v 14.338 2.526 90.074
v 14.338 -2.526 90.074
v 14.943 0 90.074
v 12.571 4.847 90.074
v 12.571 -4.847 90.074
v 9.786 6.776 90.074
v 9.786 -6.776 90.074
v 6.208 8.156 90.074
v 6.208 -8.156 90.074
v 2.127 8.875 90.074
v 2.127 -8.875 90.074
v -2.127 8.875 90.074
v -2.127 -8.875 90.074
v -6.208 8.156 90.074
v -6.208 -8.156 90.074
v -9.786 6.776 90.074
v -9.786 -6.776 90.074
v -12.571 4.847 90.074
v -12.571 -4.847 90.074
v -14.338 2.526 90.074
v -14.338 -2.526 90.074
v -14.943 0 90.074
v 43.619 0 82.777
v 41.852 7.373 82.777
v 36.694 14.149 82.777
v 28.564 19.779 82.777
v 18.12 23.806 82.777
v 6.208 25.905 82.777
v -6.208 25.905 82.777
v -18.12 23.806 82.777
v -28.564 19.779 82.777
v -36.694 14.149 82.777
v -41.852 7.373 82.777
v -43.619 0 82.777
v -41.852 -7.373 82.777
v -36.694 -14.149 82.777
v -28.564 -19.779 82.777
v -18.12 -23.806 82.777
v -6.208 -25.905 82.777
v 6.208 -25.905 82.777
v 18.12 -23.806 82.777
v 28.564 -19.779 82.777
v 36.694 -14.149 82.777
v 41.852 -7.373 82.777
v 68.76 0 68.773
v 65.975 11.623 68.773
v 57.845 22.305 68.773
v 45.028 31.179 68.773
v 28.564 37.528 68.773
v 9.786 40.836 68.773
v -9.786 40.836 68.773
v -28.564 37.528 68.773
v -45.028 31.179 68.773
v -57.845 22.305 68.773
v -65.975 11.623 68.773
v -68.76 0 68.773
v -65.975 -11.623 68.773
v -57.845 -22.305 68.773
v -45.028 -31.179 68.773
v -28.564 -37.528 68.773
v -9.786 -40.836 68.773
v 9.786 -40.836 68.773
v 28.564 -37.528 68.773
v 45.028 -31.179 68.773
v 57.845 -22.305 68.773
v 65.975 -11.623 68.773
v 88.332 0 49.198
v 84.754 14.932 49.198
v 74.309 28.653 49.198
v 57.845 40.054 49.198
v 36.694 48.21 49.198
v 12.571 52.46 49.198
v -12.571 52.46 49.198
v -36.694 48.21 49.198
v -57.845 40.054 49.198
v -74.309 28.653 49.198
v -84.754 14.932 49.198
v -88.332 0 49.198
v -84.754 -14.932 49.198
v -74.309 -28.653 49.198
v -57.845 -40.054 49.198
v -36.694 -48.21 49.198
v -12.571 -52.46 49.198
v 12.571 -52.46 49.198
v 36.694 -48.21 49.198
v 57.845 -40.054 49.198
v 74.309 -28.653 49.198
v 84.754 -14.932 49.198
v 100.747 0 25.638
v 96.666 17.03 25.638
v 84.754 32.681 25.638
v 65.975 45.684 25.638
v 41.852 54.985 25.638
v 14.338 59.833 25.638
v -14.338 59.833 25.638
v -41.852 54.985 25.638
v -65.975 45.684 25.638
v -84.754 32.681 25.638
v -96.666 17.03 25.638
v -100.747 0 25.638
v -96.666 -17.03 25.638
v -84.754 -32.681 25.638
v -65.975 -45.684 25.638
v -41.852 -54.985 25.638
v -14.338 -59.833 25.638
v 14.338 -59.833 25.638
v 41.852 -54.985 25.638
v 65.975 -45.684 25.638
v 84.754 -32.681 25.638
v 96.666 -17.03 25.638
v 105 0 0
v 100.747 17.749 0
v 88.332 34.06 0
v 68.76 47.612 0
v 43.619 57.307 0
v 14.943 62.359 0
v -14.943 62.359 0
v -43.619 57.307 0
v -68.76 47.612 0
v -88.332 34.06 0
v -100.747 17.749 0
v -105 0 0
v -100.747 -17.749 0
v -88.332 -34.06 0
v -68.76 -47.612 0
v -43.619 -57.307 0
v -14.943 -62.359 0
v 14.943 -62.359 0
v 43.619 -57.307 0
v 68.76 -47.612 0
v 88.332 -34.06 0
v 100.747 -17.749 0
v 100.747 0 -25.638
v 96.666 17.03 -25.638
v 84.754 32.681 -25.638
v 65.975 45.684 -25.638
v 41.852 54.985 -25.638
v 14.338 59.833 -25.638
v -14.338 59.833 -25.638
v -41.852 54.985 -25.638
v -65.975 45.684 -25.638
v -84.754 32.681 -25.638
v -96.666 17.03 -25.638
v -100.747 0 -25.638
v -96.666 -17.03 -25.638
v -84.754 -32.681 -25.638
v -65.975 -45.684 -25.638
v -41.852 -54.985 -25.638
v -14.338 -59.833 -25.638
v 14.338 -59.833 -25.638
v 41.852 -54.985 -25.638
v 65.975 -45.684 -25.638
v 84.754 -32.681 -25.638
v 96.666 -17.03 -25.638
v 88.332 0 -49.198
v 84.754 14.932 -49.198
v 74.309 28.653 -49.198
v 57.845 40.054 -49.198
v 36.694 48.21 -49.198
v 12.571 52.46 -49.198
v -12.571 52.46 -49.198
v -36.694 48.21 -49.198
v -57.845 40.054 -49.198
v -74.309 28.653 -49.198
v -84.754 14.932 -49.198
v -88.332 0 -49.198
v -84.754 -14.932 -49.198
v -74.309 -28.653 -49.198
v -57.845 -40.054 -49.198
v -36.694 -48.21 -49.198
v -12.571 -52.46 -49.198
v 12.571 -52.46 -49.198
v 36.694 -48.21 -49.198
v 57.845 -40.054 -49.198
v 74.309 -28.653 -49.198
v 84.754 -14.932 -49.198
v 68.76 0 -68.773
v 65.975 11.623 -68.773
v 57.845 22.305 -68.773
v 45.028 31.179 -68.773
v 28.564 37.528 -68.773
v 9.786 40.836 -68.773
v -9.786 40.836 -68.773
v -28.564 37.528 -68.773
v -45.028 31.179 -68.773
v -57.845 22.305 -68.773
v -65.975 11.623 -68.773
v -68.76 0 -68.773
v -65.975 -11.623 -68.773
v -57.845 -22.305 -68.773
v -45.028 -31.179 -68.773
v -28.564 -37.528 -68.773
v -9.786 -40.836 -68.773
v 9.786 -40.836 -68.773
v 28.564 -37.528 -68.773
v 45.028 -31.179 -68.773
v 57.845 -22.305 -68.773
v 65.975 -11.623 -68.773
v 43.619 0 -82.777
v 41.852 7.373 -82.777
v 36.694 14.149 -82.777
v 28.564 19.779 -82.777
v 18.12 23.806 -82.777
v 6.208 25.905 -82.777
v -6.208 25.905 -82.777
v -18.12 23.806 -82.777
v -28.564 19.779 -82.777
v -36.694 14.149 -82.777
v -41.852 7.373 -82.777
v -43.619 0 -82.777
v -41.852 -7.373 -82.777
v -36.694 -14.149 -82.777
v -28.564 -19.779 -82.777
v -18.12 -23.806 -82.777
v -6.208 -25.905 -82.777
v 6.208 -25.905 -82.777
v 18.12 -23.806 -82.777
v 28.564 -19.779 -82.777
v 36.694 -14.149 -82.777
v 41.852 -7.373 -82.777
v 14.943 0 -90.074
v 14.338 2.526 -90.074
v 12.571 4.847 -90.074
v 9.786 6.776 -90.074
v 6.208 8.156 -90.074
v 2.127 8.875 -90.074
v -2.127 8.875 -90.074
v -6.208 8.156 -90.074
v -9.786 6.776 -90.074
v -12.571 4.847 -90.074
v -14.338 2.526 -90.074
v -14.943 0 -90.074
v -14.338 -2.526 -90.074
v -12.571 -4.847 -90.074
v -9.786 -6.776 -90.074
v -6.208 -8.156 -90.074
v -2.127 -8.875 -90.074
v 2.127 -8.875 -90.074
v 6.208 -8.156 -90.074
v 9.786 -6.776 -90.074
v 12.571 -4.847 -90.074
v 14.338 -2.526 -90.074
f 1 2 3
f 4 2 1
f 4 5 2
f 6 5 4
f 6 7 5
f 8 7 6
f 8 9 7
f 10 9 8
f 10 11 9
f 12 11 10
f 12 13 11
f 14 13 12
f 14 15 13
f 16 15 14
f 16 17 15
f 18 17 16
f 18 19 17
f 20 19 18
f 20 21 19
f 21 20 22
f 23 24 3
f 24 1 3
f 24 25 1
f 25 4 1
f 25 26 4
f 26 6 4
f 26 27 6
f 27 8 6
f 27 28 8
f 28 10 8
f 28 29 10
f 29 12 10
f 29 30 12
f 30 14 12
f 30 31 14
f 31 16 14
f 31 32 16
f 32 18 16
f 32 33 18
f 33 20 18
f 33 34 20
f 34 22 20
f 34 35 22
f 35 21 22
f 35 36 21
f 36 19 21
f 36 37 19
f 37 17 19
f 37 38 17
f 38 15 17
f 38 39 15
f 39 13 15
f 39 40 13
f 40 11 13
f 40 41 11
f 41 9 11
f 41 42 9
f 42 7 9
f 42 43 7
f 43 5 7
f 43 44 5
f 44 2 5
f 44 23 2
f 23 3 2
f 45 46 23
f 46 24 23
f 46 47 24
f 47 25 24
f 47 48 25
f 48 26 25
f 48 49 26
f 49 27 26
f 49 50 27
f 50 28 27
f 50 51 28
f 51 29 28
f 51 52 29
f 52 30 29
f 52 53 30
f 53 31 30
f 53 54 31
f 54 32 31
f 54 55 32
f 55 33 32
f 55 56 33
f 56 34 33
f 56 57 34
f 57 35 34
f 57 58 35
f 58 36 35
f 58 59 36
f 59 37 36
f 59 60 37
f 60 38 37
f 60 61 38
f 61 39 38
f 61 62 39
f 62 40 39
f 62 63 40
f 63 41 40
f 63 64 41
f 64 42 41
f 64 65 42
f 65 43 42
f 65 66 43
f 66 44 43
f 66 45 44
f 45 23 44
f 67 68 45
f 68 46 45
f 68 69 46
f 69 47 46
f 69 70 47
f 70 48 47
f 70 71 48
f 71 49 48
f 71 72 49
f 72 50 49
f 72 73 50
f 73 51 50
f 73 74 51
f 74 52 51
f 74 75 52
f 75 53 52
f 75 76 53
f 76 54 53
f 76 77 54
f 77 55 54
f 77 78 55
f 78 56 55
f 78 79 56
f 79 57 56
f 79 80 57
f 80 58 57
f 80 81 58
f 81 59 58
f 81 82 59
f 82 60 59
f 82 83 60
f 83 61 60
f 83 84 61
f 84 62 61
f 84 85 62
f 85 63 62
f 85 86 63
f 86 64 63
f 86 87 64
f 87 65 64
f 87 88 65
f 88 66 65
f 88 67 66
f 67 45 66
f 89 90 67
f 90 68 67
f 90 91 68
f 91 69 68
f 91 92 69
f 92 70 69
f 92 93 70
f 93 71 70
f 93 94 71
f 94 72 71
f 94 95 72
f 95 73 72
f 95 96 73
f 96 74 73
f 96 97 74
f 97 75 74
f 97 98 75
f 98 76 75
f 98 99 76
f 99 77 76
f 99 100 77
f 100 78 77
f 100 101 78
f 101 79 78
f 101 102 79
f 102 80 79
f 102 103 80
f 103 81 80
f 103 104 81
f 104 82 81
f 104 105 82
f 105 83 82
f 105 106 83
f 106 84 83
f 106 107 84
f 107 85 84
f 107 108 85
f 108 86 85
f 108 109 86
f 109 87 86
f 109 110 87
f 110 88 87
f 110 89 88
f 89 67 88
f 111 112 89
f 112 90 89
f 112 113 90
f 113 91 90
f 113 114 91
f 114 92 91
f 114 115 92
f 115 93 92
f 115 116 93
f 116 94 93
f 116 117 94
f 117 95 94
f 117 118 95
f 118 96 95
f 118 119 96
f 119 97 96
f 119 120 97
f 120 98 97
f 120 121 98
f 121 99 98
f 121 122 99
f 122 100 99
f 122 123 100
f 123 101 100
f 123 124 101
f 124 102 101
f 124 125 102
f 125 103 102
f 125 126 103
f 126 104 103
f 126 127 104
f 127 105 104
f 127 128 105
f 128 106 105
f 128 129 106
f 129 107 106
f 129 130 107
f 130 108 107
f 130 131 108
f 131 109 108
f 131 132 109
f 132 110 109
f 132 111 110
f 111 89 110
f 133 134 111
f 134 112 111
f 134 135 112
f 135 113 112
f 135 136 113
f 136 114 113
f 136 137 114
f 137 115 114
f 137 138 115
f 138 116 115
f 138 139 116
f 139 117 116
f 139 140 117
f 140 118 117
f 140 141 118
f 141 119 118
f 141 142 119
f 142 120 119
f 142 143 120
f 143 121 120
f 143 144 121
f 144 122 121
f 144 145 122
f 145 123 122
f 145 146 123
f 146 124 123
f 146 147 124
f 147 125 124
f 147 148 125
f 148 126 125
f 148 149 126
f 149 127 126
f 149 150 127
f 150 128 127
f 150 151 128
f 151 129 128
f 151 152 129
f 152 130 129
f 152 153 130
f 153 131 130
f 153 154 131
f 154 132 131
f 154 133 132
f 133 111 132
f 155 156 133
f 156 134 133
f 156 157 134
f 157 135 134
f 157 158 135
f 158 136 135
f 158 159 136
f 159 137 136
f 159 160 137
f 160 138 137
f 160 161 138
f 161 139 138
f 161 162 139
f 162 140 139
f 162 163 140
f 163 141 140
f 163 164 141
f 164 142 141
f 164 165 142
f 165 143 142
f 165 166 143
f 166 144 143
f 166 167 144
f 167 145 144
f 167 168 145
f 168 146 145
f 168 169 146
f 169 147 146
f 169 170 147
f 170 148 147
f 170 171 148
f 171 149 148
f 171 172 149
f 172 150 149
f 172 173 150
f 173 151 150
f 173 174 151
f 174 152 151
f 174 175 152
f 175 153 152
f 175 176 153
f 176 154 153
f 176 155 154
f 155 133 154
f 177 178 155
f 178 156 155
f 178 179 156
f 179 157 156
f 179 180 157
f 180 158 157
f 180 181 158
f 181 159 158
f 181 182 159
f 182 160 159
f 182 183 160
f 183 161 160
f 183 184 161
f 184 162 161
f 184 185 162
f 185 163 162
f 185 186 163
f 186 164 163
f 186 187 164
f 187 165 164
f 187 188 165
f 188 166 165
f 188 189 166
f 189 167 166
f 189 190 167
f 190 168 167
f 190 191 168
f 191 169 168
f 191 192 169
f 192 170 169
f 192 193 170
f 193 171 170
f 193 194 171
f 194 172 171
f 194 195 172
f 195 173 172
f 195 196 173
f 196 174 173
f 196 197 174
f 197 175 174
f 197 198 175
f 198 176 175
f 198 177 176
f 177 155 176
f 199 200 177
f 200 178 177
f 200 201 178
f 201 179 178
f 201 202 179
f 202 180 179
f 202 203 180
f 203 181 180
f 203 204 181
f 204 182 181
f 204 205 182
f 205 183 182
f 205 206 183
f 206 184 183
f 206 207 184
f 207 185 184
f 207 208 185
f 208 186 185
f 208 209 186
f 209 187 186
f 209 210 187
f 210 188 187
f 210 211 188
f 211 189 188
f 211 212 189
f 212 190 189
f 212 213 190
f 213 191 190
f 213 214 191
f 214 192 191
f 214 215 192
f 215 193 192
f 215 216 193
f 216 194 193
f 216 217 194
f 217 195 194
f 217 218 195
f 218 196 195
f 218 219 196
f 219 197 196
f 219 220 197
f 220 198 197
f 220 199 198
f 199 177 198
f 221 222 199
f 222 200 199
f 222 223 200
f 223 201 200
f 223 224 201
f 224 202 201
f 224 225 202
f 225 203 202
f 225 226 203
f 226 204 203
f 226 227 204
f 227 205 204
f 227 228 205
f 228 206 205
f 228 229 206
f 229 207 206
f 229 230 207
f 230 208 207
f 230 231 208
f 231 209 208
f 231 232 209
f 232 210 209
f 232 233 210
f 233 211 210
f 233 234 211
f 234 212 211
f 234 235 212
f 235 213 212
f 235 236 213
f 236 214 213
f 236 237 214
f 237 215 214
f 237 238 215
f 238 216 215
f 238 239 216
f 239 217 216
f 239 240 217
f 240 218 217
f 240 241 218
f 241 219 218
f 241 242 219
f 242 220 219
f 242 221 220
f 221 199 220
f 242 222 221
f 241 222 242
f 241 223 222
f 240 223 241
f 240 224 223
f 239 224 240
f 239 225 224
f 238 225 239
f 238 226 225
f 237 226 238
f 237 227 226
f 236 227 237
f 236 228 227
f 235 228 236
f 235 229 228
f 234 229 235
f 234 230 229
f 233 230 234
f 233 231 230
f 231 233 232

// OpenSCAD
// Generated by SolidPython 1.0.1 on 2020-07-29 00:46:52


scale(v = [15, 9, 13]) {
	sphere(r = 7);
}
/***********************************************
*********      SolidPython code:      **********
************************************************
 
# import packages: SolidPython
from solid import *
from solid.utils import *
from itertools import chain, combinations, permutations


class Resize:

    def __init__(self, scad_file):
        self.scad_file = scad_file
        #self.scad_file = import_scad(scad_file)
        # cone/cylinder param:
        self.r1 = 0
        self.r2 = 0
        self.h = 0
        # rectangular prism param:
        self.w = 0
        self.l = 0
        # ellipse param:
        self.r = 0

    # import OpenScad code (file name corresponds to shape)


    # classify shape + parameters
    def assign(self, param1, param2, param3):
        if self.scad_file == 'cone.scad':
            self.r1 = param1
            self.r2 = param2
            self.h = param3
        elif self.scad_file == 'cylinder.scad':
            self.r1 = param1
            self.r2 = param2
            self.h = param3
        elif self.scad_file == 'rectangularPrism.scad':
            self.h = param1
            self.l = param2
            self.w = param3
        else:
            self.r = param1
            self.h = param2

    # resize parameters
    def iterate(self):
        x = range(3, 20, 2)
        i = 1
        if self.scad_file == 'cone.scad':
            tempList = list(permutations(x, 2))
            for temp in tempList:
                param1 = temp[0]
                param2 = temp[1]
                filepath = 'produced_scad_files/' + 'cone' + str(param1) + '_' + str(param2) + '_' + '.scad'
                scad_render_to_file(cylinder(h=param1, r1=param2, r2=0), filepath)

        elif self.scad_file == 'cylinder.scad':
            tempList = list(permutations(x, 3))
            for temp in tempList:
                param1 = temp[0]
                param2 = temp[1]
                filepath = 'produced_scad_files/' + 'cylinder' + str(param1) + '_' + str(param2) + '_' + '.scad'
                scad_render_to_file(cylinder(h=param1, r1=param2, r2=param2), filepath)

        elif self.scad_file == 'rectangularPrism.scad':
            tempList = list(permutations(x, 3))
            for temp in tempList:
                param1 = temp[0]
                param2 = temp[1]
                param3 = temp[2]
                filepath = 'produced_scad_files/' + 'rectangularPrism' + str(param1) + '_' + str(param2) + '_' + str(
                    param3) + '.scad'
                scad_render_to_file(cube(size=(param1, param2, param3)), filepath)

        elif self.scad_file == 'ellipse.scad':
            tempList = list(permutations(x, 4))
            for temp in tempList:
                param1 = temp[0]
                param2 = temp[1]
                param3 = temp[2]
                param4 = temp[3]
                filepath = 'produced_scad_files/' + 'ellipse' + str(param1) + '_' + str(param2) + '_' + str(param3) + '_' + str(param4) + '.scad'
                scad_render_to_file(scale([param1, param2, param3])(sphere(r=param4)), filepath)

    def render_to_scadfile(self):
        scad_render_to_file(scad, 'example.scad') 
 
************************************************/
